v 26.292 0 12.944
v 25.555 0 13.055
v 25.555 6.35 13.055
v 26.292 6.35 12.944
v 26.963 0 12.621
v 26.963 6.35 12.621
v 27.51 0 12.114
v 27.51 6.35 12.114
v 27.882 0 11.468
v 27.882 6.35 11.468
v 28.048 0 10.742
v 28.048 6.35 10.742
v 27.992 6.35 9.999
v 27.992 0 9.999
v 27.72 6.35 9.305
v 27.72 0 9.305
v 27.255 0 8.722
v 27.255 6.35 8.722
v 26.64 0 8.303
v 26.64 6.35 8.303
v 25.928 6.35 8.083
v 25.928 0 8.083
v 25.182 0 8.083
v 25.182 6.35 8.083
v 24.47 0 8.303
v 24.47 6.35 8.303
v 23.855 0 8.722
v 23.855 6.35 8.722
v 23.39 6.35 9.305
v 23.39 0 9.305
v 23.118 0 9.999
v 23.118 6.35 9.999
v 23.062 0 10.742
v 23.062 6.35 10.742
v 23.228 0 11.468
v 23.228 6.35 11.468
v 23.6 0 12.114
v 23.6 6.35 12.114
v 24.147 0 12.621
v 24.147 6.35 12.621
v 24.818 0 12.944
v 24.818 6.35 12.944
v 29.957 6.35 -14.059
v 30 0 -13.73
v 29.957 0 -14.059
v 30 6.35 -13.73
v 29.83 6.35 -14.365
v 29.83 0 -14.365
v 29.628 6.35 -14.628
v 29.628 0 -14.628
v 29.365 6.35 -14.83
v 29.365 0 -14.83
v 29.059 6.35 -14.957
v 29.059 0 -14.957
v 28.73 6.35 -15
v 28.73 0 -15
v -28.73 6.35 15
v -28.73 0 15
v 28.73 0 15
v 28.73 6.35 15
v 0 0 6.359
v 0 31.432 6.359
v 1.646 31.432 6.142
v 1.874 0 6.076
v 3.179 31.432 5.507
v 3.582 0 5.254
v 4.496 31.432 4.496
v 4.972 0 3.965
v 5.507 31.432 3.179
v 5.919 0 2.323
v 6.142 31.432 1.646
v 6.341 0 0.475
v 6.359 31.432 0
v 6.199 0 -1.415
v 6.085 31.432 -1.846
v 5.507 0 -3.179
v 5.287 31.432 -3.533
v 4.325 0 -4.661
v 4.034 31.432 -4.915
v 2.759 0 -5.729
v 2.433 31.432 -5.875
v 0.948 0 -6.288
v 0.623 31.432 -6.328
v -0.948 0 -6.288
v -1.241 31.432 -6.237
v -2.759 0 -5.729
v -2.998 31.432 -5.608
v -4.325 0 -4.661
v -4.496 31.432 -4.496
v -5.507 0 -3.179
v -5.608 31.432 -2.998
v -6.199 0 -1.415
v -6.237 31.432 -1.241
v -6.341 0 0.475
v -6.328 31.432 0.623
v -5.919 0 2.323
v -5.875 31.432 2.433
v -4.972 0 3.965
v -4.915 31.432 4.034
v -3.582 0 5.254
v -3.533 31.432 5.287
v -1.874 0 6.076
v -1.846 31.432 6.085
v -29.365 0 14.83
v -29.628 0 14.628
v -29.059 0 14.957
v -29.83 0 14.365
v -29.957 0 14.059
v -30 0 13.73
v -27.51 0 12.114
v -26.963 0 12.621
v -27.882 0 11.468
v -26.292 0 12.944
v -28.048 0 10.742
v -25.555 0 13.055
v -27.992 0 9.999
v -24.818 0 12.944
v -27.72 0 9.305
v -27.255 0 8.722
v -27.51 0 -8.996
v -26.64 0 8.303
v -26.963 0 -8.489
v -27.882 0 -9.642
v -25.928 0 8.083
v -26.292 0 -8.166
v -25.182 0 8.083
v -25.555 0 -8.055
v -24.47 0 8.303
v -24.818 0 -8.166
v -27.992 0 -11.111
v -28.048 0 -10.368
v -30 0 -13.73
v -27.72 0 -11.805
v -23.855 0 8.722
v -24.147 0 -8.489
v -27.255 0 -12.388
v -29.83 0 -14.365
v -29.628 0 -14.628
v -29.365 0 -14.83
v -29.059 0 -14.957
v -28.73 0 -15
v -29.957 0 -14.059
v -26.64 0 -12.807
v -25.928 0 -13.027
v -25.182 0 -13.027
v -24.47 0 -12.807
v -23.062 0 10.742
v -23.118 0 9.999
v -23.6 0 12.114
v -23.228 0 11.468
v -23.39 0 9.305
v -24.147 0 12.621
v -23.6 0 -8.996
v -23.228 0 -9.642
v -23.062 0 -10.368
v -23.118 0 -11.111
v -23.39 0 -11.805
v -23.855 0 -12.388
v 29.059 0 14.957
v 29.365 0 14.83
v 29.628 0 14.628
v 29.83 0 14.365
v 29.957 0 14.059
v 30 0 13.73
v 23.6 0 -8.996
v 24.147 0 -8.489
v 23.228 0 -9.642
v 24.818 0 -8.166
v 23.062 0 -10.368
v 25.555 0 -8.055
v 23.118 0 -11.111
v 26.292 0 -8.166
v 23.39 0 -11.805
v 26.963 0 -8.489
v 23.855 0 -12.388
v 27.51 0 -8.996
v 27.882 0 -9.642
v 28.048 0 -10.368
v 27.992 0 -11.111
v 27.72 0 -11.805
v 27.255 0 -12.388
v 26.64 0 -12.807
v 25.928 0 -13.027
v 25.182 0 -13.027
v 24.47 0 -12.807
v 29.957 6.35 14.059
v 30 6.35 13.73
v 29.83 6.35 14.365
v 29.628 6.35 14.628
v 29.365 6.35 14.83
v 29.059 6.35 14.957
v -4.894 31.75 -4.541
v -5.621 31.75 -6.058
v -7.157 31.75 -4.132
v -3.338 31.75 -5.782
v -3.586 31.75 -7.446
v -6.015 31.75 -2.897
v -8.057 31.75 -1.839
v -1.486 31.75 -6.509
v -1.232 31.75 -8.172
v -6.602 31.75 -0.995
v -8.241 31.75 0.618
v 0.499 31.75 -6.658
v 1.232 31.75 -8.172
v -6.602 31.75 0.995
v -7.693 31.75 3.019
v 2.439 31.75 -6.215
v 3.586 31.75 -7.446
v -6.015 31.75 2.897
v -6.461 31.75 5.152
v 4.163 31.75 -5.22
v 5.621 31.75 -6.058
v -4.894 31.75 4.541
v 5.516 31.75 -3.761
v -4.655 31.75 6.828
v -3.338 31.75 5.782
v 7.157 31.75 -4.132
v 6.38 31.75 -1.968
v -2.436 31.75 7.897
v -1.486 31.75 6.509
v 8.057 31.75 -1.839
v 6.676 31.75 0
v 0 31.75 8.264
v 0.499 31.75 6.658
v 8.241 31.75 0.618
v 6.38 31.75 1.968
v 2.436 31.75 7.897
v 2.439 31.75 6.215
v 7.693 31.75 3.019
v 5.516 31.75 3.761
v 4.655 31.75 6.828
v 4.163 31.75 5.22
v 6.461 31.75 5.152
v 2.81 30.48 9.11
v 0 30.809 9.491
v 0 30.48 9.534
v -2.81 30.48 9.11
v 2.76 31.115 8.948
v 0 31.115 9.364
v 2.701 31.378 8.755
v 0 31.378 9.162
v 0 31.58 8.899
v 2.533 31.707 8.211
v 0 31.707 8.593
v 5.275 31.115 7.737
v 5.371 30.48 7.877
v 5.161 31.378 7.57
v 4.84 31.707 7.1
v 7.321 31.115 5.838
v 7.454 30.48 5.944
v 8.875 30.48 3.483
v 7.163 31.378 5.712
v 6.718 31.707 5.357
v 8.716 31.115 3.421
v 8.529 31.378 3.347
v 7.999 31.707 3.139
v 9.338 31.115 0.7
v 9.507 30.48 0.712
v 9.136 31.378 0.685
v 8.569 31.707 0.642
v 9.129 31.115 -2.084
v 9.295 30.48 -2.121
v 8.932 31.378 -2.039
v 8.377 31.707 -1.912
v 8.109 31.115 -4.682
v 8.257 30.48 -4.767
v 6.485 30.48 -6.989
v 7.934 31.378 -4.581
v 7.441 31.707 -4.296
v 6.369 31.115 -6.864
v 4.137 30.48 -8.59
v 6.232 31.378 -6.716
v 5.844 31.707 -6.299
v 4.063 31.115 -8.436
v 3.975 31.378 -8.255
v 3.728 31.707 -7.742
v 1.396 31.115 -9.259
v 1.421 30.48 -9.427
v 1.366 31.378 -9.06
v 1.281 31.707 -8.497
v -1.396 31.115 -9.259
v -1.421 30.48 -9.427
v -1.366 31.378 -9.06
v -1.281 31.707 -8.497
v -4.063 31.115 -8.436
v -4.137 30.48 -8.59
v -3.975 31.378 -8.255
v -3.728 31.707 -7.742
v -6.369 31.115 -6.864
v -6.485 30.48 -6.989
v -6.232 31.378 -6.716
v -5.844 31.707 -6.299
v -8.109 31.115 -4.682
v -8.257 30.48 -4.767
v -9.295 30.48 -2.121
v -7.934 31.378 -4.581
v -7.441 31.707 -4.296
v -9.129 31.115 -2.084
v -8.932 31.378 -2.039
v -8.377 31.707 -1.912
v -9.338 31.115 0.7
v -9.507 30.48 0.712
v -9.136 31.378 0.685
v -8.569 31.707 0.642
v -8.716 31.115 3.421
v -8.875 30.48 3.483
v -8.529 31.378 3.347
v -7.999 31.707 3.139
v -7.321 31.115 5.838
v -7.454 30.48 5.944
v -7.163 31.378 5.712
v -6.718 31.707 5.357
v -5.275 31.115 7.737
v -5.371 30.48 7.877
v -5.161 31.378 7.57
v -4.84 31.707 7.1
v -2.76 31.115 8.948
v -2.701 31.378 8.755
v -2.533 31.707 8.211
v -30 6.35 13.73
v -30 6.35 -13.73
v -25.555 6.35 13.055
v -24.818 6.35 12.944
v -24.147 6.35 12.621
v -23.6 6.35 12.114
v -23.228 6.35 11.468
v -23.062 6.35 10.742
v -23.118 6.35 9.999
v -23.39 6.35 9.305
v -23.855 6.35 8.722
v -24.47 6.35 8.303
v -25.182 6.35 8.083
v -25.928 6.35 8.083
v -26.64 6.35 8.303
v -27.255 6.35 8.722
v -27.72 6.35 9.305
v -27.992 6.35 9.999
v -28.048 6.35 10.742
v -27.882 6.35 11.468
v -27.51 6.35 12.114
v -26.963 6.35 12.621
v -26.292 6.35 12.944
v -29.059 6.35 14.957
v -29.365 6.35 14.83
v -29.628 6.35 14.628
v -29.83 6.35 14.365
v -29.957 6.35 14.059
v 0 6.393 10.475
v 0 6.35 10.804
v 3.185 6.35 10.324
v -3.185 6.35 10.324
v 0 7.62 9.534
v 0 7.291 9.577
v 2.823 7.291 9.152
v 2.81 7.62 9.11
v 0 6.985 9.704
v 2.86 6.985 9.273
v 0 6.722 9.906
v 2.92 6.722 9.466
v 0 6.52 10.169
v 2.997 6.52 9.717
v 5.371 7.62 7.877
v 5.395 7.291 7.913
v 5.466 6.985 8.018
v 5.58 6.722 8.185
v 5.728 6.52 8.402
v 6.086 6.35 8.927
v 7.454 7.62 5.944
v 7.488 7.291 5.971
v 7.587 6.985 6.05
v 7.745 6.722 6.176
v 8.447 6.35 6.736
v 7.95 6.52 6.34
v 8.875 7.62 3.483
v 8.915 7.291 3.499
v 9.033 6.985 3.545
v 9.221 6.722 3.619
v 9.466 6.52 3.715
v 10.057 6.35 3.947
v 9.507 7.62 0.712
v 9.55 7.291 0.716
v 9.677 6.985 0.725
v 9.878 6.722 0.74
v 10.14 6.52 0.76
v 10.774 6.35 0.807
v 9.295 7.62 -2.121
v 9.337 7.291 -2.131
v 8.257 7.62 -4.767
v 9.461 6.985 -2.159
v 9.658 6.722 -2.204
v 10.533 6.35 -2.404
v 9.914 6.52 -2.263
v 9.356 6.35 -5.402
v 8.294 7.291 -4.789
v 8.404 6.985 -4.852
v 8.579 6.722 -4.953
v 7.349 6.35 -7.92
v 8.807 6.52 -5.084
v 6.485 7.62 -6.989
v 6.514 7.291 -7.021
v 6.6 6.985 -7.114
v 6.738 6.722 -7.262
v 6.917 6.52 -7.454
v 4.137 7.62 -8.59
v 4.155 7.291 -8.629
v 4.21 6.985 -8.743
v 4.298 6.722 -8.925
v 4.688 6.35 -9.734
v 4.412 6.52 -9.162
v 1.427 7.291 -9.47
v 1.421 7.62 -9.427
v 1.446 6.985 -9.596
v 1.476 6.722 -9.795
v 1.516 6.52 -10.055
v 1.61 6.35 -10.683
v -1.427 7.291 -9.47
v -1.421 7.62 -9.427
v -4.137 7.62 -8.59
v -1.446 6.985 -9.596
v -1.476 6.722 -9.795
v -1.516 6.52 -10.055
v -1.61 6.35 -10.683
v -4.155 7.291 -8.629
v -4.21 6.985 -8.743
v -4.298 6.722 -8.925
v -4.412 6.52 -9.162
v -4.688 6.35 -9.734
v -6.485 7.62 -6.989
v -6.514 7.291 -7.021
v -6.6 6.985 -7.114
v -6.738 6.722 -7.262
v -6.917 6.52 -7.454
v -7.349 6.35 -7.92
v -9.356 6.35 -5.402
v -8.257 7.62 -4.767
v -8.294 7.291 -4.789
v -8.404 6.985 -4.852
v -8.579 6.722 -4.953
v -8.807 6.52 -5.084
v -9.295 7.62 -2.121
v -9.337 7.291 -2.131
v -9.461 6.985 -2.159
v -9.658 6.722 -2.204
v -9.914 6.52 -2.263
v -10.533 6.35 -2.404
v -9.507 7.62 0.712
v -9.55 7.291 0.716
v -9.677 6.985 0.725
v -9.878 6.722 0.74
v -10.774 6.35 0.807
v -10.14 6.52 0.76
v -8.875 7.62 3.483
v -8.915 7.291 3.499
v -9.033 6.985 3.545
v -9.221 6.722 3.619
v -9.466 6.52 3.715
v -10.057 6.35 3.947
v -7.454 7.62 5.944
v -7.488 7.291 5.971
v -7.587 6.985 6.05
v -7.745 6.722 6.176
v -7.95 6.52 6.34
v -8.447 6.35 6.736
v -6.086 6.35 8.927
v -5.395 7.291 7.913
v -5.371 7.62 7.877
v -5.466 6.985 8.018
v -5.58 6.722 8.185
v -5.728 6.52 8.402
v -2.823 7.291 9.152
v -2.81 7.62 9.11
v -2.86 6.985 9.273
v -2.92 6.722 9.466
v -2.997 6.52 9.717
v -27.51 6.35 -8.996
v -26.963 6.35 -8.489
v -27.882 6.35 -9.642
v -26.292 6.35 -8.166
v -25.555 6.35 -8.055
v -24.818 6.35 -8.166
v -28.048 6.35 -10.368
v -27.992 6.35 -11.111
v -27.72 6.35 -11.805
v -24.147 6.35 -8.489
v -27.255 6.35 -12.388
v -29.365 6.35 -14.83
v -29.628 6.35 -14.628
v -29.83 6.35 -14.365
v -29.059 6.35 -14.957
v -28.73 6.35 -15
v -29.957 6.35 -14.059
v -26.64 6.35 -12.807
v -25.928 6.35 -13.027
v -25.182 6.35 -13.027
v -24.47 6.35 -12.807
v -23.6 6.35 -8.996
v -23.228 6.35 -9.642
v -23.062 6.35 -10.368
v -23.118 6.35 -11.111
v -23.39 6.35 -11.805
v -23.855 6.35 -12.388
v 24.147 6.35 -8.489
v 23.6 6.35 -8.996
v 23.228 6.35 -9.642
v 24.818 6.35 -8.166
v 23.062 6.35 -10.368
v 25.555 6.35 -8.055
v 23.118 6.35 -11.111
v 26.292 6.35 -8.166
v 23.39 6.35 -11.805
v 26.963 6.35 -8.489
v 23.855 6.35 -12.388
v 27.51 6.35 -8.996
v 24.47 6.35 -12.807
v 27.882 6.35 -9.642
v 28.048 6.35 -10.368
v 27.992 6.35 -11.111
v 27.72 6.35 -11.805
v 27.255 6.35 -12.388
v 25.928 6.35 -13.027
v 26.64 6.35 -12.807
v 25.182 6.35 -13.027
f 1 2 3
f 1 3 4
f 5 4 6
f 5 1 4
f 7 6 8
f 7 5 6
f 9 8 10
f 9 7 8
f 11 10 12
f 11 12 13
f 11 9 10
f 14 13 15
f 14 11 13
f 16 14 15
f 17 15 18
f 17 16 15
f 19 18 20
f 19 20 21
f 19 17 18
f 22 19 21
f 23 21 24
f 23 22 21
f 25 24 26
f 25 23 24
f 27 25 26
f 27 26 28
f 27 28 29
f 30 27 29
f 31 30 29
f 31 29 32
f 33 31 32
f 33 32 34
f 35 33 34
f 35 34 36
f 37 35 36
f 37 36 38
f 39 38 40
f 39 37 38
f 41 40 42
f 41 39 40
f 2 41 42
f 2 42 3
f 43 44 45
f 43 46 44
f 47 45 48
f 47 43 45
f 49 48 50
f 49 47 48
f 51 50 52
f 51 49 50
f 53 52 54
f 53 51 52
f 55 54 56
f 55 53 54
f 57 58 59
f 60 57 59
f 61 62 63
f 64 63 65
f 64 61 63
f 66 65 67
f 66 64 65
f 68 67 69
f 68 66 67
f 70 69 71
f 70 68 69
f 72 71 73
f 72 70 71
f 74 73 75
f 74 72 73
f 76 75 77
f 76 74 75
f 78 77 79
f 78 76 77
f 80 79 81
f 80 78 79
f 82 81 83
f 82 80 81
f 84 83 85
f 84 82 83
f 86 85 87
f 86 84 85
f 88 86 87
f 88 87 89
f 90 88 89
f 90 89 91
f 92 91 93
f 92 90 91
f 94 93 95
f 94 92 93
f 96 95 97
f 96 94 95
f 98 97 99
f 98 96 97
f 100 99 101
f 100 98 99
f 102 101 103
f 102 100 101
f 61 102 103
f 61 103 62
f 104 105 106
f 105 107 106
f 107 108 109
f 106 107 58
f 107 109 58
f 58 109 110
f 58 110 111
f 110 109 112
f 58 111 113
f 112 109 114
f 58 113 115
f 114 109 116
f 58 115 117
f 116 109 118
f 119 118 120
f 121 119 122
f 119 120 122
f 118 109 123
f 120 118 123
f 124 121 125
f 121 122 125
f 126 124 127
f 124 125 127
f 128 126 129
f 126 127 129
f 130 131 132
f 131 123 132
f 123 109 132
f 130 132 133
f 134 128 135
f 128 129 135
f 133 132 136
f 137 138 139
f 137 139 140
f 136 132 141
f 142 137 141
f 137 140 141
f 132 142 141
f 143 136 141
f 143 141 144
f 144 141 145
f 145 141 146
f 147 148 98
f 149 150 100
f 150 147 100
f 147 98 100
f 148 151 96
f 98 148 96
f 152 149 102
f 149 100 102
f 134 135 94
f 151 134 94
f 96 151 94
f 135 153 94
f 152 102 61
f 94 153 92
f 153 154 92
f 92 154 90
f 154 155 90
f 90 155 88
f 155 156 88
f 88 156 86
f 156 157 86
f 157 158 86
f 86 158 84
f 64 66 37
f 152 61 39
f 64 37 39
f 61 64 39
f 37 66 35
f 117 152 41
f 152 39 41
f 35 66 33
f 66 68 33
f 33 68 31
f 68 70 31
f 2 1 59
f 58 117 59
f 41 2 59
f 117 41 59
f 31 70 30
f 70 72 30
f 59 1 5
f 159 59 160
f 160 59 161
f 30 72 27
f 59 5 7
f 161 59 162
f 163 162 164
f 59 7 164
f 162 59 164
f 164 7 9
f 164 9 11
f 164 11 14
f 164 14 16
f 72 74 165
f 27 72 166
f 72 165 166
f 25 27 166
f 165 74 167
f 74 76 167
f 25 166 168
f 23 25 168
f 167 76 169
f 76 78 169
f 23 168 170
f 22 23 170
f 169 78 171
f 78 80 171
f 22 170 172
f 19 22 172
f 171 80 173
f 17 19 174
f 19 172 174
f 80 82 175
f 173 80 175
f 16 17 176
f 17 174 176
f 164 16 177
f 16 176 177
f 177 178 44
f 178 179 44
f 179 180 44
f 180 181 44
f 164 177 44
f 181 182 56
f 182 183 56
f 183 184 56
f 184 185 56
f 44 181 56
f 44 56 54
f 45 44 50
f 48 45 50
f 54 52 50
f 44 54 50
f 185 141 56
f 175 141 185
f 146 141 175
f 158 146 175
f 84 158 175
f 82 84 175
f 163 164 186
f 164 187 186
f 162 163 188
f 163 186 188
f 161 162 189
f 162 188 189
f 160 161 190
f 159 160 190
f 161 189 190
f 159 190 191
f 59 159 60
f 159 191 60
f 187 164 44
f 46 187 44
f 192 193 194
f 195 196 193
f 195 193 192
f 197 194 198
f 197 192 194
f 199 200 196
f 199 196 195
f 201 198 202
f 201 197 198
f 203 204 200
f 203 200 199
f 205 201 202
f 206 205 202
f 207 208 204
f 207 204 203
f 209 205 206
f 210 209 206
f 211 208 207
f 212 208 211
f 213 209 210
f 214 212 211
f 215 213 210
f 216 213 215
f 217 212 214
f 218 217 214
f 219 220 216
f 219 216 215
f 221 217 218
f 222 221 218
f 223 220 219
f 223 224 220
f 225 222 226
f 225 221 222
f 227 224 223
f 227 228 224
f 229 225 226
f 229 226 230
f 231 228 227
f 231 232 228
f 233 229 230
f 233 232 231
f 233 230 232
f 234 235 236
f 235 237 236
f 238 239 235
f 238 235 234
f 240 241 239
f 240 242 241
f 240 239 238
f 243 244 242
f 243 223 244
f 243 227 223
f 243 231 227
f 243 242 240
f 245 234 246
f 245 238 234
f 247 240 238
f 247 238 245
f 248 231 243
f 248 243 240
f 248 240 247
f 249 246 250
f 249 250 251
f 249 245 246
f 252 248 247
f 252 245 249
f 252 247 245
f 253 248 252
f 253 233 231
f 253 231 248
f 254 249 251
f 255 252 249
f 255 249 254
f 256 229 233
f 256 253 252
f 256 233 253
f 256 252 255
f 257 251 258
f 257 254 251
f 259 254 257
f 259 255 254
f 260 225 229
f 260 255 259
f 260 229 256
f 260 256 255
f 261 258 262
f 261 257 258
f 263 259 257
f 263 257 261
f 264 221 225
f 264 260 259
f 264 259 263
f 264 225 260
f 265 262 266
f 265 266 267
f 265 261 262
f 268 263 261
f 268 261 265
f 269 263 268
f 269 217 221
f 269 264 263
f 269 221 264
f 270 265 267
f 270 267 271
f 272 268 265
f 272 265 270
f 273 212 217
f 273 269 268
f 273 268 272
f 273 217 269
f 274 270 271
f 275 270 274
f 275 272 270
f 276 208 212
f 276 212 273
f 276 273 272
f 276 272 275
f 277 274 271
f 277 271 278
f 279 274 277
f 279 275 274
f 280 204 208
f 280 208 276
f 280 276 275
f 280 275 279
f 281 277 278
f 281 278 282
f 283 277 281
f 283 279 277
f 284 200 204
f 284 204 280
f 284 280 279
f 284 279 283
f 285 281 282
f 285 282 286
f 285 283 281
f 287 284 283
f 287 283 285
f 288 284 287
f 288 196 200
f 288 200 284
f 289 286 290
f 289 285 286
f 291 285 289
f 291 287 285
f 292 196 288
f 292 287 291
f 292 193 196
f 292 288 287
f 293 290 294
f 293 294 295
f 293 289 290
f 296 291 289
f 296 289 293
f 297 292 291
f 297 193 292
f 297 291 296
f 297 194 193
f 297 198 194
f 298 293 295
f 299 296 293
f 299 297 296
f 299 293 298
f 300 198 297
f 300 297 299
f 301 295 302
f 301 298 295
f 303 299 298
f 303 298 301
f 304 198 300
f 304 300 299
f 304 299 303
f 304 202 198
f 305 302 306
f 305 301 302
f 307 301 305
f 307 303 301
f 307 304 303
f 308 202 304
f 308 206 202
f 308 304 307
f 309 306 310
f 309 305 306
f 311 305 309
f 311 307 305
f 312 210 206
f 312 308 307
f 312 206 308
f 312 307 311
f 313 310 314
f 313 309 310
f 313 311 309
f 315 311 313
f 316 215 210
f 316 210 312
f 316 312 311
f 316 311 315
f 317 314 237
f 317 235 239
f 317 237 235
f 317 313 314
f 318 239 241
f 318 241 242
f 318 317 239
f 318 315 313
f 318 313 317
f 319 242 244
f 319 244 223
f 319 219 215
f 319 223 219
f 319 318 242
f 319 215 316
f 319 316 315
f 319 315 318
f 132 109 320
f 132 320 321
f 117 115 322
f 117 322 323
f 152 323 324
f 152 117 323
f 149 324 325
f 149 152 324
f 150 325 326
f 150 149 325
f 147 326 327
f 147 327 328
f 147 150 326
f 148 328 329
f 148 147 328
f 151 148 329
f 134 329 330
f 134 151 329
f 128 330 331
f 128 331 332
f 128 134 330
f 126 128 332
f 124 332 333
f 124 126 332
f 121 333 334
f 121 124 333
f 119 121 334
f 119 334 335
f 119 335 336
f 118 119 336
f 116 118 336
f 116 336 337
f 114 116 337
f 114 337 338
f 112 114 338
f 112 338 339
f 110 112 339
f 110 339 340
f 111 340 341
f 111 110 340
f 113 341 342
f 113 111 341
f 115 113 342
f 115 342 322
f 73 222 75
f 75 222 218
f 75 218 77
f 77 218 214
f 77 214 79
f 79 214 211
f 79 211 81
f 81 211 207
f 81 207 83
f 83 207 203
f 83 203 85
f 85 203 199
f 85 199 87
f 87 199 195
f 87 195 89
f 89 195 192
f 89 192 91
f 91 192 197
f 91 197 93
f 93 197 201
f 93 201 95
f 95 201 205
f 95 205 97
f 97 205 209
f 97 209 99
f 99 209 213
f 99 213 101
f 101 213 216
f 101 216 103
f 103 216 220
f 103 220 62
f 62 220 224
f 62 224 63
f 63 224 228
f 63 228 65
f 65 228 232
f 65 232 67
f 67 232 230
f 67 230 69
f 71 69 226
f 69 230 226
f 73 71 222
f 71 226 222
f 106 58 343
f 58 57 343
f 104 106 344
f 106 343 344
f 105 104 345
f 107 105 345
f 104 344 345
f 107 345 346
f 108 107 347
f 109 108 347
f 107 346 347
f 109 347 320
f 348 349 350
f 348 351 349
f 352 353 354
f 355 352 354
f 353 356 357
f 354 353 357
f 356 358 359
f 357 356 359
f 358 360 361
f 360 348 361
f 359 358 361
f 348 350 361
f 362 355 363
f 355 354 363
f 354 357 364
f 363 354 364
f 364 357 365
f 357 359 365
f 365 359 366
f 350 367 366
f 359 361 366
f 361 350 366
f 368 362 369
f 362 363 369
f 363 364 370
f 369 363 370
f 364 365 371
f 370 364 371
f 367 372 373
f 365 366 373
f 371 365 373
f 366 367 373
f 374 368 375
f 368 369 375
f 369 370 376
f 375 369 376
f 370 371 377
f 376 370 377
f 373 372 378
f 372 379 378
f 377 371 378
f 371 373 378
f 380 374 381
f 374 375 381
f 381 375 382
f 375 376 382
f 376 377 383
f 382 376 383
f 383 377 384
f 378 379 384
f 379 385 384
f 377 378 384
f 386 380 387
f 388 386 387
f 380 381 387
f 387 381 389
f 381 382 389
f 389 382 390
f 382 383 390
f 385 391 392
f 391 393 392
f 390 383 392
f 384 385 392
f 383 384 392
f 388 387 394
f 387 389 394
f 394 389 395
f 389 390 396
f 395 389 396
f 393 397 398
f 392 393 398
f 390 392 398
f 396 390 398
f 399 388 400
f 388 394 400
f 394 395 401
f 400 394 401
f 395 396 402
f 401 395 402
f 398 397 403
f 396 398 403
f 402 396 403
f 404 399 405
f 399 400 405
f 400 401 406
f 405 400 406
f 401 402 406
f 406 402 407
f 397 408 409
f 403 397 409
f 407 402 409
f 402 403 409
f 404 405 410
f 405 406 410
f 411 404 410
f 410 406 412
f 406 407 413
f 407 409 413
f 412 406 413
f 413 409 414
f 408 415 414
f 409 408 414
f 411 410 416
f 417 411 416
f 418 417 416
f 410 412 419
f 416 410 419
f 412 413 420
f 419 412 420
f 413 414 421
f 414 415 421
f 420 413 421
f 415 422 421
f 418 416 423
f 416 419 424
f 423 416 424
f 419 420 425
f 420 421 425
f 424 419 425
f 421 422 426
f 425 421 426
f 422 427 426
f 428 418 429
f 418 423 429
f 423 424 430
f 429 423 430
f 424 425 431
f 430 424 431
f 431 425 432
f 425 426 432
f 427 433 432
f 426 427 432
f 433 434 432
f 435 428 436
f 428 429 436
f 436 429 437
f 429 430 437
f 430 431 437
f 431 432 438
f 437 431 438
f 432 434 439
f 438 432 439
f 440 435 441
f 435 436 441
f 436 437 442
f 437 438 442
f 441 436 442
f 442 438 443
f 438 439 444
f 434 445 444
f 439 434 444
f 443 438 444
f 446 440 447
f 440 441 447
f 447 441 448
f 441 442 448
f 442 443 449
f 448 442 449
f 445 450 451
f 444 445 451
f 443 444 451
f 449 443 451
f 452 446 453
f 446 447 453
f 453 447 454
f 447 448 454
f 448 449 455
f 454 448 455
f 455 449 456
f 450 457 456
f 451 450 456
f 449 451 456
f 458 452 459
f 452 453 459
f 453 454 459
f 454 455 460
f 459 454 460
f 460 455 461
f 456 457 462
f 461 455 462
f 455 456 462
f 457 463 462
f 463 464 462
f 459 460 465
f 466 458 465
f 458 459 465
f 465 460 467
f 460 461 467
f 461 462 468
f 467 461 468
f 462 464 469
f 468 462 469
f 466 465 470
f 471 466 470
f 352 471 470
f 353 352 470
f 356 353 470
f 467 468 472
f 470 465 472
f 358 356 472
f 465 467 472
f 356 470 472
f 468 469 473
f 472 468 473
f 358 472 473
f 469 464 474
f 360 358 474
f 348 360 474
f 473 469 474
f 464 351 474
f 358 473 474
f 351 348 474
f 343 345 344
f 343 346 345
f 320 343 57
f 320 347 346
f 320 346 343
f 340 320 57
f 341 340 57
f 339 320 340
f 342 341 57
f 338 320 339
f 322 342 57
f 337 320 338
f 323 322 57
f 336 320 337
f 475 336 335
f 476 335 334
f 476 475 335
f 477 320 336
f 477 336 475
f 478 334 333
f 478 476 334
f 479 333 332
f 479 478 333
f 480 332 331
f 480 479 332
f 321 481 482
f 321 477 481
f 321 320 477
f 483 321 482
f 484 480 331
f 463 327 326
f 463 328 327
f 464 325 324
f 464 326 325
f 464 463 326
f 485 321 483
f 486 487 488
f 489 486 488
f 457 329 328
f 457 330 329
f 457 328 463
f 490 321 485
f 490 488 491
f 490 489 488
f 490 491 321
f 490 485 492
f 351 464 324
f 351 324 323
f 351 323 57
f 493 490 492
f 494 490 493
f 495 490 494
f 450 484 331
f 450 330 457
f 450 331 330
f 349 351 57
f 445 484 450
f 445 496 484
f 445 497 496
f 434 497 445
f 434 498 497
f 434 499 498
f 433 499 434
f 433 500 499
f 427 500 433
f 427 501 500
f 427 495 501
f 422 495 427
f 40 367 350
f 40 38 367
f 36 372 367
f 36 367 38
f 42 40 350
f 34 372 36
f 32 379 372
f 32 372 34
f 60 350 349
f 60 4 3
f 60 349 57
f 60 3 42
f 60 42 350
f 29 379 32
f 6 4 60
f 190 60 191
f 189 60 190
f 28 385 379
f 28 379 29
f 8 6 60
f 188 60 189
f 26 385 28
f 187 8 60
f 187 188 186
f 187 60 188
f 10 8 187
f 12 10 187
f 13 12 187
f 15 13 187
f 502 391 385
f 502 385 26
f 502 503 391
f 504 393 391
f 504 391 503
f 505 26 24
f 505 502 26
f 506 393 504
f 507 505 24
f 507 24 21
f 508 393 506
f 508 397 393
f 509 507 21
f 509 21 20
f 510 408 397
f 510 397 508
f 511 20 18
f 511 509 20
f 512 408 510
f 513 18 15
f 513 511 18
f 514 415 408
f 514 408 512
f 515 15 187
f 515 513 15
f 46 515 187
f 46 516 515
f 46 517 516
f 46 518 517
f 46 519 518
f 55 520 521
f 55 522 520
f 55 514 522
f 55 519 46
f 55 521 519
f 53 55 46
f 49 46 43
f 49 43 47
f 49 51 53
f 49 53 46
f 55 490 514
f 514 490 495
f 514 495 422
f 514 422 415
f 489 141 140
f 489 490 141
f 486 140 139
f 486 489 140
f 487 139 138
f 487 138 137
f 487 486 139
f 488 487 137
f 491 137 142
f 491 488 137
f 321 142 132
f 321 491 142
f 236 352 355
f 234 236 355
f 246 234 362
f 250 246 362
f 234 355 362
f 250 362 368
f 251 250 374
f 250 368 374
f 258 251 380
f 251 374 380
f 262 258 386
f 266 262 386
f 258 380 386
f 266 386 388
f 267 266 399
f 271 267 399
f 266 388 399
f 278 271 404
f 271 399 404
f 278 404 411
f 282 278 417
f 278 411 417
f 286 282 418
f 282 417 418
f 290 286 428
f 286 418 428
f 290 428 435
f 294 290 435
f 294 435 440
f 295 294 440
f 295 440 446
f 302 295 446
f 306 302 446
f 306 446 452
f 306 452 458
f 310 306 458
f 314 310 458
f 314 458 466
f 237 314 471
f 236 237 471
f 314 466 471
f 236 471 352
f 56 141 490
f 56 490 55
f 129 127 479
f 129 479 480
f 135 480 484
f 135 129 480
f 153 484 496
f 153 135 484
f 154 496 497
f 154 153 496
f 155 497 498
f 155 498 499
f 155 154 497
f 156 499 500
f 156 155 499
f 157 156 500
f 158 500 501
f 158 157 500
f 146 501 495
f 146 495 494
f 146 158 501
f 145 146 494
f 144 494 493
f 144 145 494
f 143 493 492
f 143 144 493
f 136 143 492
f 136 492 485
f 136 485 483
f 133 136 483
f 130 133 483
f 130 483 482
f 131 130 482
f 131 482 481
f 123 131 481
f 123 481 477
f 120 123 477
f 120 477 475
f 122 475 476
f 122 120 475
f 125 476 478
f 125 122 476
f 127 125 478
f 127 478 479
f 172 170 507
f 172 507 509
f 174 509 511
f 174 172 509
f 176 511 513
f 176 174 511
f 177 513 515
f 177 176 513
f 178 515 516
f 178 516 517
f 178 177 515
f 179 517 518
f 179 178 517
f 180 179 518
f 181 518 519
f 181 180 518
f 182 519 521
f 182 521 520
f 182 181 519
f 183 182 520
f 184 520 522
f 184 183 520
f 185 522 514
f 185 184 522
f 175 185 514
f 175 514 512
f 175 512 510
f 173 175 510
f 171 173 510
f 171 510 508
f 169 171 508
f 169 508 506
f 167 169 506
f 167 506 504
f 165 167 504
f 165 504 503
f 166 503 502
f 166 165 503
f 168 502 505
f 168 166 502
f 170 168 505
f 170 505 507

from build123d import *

# Parameters (mm, degrees)
SKETCH1_W           = 59.999999888
SKETCH1_H           = 29.999999944
SKETCH1_R           = 2.499999953
SKETCH1_R_2         = 6.35889
BOSS_EXTRUDE1_DEPTH = 6.35
SKETCH2_R           = 9.53389
SKETCH2_R_2         = 6.35889
BOSS_EXTRUDE2_DEPTH = 25.4
FILLET1_R           = 1.27
CHAMFER5_SIZE       = 0.3175


with BuildPart() as part:
    # Sketch1 → Boss-Extrude1 (new body)
    with BuildSketch(Plane(origin=(0, 0, 0), x_dir=(1, 0, 0), z_dir=(0, 1, 0))):
        Rectangle(SKETCH1_W, SKETCH1_H)
        with Locations((-25.554999944, 10.554999972)):
            Circle(SKETCH1_R, mode=Mode.SUBTRACT)
        with Locations((25.554999944, 10.554999972)):
            Circle(SKETCH1_R, mode=Mode.SUBTRACT)
        with Locations((25.554999944, -10.554999972)):
            Circle(SKETCH1_R, mode=Mode.SUBTRACT)
        with Locations((-25.554999944, -10.554999972)):
            Circle(SKETCH1_R, mode=Mode.SUBTRACT)
        Circle(SKETCH1_R_2, mode=Mode.SUBTRACT)
    extrude(amount=BOSS_EXTRUDE1_DEPTH)

    # Sketch2 → Boss-Extrude2 (add)
    with BuildSketch(Plane(origin=(0, 6.35, 0), x_dir=(1, 0, 0), z_dir=(0, 1, 0))):
        Circle(SKETCH2_R)
        Circle(SKETCH2_R_2, mode=Mode.SUBTRACT)
    extrude(amount=BOSS_EXTRUDE2_DEPTH)

    # Fillet1
    fillet1_edges = [part.edges().sort_by_distance(p)[0] for p in [
        (-9.53389, 31.75, 0),
        (-9.53389, 6.35, 0),
        (-29.999999944, 3.175, -14.999999972),
        (-29.999999944, 3.175, 14.999999972),
        (29.999999944, 3.175, -14.999999972),
        (29.999999944, 3.175, 14.999999972),
    ]]
    fillet(fillet1_edges, radius=FILLET1_R)

    # Chamfer5
    chamfer5_edges = [part.edges().sort_by_distance(p)[0] for p in [
        (-6.35889, 31.75, 0),
    ]]
    chamfer(chamfer5_edges, length=CHAMFER5_SIZE)


solid = part.part
